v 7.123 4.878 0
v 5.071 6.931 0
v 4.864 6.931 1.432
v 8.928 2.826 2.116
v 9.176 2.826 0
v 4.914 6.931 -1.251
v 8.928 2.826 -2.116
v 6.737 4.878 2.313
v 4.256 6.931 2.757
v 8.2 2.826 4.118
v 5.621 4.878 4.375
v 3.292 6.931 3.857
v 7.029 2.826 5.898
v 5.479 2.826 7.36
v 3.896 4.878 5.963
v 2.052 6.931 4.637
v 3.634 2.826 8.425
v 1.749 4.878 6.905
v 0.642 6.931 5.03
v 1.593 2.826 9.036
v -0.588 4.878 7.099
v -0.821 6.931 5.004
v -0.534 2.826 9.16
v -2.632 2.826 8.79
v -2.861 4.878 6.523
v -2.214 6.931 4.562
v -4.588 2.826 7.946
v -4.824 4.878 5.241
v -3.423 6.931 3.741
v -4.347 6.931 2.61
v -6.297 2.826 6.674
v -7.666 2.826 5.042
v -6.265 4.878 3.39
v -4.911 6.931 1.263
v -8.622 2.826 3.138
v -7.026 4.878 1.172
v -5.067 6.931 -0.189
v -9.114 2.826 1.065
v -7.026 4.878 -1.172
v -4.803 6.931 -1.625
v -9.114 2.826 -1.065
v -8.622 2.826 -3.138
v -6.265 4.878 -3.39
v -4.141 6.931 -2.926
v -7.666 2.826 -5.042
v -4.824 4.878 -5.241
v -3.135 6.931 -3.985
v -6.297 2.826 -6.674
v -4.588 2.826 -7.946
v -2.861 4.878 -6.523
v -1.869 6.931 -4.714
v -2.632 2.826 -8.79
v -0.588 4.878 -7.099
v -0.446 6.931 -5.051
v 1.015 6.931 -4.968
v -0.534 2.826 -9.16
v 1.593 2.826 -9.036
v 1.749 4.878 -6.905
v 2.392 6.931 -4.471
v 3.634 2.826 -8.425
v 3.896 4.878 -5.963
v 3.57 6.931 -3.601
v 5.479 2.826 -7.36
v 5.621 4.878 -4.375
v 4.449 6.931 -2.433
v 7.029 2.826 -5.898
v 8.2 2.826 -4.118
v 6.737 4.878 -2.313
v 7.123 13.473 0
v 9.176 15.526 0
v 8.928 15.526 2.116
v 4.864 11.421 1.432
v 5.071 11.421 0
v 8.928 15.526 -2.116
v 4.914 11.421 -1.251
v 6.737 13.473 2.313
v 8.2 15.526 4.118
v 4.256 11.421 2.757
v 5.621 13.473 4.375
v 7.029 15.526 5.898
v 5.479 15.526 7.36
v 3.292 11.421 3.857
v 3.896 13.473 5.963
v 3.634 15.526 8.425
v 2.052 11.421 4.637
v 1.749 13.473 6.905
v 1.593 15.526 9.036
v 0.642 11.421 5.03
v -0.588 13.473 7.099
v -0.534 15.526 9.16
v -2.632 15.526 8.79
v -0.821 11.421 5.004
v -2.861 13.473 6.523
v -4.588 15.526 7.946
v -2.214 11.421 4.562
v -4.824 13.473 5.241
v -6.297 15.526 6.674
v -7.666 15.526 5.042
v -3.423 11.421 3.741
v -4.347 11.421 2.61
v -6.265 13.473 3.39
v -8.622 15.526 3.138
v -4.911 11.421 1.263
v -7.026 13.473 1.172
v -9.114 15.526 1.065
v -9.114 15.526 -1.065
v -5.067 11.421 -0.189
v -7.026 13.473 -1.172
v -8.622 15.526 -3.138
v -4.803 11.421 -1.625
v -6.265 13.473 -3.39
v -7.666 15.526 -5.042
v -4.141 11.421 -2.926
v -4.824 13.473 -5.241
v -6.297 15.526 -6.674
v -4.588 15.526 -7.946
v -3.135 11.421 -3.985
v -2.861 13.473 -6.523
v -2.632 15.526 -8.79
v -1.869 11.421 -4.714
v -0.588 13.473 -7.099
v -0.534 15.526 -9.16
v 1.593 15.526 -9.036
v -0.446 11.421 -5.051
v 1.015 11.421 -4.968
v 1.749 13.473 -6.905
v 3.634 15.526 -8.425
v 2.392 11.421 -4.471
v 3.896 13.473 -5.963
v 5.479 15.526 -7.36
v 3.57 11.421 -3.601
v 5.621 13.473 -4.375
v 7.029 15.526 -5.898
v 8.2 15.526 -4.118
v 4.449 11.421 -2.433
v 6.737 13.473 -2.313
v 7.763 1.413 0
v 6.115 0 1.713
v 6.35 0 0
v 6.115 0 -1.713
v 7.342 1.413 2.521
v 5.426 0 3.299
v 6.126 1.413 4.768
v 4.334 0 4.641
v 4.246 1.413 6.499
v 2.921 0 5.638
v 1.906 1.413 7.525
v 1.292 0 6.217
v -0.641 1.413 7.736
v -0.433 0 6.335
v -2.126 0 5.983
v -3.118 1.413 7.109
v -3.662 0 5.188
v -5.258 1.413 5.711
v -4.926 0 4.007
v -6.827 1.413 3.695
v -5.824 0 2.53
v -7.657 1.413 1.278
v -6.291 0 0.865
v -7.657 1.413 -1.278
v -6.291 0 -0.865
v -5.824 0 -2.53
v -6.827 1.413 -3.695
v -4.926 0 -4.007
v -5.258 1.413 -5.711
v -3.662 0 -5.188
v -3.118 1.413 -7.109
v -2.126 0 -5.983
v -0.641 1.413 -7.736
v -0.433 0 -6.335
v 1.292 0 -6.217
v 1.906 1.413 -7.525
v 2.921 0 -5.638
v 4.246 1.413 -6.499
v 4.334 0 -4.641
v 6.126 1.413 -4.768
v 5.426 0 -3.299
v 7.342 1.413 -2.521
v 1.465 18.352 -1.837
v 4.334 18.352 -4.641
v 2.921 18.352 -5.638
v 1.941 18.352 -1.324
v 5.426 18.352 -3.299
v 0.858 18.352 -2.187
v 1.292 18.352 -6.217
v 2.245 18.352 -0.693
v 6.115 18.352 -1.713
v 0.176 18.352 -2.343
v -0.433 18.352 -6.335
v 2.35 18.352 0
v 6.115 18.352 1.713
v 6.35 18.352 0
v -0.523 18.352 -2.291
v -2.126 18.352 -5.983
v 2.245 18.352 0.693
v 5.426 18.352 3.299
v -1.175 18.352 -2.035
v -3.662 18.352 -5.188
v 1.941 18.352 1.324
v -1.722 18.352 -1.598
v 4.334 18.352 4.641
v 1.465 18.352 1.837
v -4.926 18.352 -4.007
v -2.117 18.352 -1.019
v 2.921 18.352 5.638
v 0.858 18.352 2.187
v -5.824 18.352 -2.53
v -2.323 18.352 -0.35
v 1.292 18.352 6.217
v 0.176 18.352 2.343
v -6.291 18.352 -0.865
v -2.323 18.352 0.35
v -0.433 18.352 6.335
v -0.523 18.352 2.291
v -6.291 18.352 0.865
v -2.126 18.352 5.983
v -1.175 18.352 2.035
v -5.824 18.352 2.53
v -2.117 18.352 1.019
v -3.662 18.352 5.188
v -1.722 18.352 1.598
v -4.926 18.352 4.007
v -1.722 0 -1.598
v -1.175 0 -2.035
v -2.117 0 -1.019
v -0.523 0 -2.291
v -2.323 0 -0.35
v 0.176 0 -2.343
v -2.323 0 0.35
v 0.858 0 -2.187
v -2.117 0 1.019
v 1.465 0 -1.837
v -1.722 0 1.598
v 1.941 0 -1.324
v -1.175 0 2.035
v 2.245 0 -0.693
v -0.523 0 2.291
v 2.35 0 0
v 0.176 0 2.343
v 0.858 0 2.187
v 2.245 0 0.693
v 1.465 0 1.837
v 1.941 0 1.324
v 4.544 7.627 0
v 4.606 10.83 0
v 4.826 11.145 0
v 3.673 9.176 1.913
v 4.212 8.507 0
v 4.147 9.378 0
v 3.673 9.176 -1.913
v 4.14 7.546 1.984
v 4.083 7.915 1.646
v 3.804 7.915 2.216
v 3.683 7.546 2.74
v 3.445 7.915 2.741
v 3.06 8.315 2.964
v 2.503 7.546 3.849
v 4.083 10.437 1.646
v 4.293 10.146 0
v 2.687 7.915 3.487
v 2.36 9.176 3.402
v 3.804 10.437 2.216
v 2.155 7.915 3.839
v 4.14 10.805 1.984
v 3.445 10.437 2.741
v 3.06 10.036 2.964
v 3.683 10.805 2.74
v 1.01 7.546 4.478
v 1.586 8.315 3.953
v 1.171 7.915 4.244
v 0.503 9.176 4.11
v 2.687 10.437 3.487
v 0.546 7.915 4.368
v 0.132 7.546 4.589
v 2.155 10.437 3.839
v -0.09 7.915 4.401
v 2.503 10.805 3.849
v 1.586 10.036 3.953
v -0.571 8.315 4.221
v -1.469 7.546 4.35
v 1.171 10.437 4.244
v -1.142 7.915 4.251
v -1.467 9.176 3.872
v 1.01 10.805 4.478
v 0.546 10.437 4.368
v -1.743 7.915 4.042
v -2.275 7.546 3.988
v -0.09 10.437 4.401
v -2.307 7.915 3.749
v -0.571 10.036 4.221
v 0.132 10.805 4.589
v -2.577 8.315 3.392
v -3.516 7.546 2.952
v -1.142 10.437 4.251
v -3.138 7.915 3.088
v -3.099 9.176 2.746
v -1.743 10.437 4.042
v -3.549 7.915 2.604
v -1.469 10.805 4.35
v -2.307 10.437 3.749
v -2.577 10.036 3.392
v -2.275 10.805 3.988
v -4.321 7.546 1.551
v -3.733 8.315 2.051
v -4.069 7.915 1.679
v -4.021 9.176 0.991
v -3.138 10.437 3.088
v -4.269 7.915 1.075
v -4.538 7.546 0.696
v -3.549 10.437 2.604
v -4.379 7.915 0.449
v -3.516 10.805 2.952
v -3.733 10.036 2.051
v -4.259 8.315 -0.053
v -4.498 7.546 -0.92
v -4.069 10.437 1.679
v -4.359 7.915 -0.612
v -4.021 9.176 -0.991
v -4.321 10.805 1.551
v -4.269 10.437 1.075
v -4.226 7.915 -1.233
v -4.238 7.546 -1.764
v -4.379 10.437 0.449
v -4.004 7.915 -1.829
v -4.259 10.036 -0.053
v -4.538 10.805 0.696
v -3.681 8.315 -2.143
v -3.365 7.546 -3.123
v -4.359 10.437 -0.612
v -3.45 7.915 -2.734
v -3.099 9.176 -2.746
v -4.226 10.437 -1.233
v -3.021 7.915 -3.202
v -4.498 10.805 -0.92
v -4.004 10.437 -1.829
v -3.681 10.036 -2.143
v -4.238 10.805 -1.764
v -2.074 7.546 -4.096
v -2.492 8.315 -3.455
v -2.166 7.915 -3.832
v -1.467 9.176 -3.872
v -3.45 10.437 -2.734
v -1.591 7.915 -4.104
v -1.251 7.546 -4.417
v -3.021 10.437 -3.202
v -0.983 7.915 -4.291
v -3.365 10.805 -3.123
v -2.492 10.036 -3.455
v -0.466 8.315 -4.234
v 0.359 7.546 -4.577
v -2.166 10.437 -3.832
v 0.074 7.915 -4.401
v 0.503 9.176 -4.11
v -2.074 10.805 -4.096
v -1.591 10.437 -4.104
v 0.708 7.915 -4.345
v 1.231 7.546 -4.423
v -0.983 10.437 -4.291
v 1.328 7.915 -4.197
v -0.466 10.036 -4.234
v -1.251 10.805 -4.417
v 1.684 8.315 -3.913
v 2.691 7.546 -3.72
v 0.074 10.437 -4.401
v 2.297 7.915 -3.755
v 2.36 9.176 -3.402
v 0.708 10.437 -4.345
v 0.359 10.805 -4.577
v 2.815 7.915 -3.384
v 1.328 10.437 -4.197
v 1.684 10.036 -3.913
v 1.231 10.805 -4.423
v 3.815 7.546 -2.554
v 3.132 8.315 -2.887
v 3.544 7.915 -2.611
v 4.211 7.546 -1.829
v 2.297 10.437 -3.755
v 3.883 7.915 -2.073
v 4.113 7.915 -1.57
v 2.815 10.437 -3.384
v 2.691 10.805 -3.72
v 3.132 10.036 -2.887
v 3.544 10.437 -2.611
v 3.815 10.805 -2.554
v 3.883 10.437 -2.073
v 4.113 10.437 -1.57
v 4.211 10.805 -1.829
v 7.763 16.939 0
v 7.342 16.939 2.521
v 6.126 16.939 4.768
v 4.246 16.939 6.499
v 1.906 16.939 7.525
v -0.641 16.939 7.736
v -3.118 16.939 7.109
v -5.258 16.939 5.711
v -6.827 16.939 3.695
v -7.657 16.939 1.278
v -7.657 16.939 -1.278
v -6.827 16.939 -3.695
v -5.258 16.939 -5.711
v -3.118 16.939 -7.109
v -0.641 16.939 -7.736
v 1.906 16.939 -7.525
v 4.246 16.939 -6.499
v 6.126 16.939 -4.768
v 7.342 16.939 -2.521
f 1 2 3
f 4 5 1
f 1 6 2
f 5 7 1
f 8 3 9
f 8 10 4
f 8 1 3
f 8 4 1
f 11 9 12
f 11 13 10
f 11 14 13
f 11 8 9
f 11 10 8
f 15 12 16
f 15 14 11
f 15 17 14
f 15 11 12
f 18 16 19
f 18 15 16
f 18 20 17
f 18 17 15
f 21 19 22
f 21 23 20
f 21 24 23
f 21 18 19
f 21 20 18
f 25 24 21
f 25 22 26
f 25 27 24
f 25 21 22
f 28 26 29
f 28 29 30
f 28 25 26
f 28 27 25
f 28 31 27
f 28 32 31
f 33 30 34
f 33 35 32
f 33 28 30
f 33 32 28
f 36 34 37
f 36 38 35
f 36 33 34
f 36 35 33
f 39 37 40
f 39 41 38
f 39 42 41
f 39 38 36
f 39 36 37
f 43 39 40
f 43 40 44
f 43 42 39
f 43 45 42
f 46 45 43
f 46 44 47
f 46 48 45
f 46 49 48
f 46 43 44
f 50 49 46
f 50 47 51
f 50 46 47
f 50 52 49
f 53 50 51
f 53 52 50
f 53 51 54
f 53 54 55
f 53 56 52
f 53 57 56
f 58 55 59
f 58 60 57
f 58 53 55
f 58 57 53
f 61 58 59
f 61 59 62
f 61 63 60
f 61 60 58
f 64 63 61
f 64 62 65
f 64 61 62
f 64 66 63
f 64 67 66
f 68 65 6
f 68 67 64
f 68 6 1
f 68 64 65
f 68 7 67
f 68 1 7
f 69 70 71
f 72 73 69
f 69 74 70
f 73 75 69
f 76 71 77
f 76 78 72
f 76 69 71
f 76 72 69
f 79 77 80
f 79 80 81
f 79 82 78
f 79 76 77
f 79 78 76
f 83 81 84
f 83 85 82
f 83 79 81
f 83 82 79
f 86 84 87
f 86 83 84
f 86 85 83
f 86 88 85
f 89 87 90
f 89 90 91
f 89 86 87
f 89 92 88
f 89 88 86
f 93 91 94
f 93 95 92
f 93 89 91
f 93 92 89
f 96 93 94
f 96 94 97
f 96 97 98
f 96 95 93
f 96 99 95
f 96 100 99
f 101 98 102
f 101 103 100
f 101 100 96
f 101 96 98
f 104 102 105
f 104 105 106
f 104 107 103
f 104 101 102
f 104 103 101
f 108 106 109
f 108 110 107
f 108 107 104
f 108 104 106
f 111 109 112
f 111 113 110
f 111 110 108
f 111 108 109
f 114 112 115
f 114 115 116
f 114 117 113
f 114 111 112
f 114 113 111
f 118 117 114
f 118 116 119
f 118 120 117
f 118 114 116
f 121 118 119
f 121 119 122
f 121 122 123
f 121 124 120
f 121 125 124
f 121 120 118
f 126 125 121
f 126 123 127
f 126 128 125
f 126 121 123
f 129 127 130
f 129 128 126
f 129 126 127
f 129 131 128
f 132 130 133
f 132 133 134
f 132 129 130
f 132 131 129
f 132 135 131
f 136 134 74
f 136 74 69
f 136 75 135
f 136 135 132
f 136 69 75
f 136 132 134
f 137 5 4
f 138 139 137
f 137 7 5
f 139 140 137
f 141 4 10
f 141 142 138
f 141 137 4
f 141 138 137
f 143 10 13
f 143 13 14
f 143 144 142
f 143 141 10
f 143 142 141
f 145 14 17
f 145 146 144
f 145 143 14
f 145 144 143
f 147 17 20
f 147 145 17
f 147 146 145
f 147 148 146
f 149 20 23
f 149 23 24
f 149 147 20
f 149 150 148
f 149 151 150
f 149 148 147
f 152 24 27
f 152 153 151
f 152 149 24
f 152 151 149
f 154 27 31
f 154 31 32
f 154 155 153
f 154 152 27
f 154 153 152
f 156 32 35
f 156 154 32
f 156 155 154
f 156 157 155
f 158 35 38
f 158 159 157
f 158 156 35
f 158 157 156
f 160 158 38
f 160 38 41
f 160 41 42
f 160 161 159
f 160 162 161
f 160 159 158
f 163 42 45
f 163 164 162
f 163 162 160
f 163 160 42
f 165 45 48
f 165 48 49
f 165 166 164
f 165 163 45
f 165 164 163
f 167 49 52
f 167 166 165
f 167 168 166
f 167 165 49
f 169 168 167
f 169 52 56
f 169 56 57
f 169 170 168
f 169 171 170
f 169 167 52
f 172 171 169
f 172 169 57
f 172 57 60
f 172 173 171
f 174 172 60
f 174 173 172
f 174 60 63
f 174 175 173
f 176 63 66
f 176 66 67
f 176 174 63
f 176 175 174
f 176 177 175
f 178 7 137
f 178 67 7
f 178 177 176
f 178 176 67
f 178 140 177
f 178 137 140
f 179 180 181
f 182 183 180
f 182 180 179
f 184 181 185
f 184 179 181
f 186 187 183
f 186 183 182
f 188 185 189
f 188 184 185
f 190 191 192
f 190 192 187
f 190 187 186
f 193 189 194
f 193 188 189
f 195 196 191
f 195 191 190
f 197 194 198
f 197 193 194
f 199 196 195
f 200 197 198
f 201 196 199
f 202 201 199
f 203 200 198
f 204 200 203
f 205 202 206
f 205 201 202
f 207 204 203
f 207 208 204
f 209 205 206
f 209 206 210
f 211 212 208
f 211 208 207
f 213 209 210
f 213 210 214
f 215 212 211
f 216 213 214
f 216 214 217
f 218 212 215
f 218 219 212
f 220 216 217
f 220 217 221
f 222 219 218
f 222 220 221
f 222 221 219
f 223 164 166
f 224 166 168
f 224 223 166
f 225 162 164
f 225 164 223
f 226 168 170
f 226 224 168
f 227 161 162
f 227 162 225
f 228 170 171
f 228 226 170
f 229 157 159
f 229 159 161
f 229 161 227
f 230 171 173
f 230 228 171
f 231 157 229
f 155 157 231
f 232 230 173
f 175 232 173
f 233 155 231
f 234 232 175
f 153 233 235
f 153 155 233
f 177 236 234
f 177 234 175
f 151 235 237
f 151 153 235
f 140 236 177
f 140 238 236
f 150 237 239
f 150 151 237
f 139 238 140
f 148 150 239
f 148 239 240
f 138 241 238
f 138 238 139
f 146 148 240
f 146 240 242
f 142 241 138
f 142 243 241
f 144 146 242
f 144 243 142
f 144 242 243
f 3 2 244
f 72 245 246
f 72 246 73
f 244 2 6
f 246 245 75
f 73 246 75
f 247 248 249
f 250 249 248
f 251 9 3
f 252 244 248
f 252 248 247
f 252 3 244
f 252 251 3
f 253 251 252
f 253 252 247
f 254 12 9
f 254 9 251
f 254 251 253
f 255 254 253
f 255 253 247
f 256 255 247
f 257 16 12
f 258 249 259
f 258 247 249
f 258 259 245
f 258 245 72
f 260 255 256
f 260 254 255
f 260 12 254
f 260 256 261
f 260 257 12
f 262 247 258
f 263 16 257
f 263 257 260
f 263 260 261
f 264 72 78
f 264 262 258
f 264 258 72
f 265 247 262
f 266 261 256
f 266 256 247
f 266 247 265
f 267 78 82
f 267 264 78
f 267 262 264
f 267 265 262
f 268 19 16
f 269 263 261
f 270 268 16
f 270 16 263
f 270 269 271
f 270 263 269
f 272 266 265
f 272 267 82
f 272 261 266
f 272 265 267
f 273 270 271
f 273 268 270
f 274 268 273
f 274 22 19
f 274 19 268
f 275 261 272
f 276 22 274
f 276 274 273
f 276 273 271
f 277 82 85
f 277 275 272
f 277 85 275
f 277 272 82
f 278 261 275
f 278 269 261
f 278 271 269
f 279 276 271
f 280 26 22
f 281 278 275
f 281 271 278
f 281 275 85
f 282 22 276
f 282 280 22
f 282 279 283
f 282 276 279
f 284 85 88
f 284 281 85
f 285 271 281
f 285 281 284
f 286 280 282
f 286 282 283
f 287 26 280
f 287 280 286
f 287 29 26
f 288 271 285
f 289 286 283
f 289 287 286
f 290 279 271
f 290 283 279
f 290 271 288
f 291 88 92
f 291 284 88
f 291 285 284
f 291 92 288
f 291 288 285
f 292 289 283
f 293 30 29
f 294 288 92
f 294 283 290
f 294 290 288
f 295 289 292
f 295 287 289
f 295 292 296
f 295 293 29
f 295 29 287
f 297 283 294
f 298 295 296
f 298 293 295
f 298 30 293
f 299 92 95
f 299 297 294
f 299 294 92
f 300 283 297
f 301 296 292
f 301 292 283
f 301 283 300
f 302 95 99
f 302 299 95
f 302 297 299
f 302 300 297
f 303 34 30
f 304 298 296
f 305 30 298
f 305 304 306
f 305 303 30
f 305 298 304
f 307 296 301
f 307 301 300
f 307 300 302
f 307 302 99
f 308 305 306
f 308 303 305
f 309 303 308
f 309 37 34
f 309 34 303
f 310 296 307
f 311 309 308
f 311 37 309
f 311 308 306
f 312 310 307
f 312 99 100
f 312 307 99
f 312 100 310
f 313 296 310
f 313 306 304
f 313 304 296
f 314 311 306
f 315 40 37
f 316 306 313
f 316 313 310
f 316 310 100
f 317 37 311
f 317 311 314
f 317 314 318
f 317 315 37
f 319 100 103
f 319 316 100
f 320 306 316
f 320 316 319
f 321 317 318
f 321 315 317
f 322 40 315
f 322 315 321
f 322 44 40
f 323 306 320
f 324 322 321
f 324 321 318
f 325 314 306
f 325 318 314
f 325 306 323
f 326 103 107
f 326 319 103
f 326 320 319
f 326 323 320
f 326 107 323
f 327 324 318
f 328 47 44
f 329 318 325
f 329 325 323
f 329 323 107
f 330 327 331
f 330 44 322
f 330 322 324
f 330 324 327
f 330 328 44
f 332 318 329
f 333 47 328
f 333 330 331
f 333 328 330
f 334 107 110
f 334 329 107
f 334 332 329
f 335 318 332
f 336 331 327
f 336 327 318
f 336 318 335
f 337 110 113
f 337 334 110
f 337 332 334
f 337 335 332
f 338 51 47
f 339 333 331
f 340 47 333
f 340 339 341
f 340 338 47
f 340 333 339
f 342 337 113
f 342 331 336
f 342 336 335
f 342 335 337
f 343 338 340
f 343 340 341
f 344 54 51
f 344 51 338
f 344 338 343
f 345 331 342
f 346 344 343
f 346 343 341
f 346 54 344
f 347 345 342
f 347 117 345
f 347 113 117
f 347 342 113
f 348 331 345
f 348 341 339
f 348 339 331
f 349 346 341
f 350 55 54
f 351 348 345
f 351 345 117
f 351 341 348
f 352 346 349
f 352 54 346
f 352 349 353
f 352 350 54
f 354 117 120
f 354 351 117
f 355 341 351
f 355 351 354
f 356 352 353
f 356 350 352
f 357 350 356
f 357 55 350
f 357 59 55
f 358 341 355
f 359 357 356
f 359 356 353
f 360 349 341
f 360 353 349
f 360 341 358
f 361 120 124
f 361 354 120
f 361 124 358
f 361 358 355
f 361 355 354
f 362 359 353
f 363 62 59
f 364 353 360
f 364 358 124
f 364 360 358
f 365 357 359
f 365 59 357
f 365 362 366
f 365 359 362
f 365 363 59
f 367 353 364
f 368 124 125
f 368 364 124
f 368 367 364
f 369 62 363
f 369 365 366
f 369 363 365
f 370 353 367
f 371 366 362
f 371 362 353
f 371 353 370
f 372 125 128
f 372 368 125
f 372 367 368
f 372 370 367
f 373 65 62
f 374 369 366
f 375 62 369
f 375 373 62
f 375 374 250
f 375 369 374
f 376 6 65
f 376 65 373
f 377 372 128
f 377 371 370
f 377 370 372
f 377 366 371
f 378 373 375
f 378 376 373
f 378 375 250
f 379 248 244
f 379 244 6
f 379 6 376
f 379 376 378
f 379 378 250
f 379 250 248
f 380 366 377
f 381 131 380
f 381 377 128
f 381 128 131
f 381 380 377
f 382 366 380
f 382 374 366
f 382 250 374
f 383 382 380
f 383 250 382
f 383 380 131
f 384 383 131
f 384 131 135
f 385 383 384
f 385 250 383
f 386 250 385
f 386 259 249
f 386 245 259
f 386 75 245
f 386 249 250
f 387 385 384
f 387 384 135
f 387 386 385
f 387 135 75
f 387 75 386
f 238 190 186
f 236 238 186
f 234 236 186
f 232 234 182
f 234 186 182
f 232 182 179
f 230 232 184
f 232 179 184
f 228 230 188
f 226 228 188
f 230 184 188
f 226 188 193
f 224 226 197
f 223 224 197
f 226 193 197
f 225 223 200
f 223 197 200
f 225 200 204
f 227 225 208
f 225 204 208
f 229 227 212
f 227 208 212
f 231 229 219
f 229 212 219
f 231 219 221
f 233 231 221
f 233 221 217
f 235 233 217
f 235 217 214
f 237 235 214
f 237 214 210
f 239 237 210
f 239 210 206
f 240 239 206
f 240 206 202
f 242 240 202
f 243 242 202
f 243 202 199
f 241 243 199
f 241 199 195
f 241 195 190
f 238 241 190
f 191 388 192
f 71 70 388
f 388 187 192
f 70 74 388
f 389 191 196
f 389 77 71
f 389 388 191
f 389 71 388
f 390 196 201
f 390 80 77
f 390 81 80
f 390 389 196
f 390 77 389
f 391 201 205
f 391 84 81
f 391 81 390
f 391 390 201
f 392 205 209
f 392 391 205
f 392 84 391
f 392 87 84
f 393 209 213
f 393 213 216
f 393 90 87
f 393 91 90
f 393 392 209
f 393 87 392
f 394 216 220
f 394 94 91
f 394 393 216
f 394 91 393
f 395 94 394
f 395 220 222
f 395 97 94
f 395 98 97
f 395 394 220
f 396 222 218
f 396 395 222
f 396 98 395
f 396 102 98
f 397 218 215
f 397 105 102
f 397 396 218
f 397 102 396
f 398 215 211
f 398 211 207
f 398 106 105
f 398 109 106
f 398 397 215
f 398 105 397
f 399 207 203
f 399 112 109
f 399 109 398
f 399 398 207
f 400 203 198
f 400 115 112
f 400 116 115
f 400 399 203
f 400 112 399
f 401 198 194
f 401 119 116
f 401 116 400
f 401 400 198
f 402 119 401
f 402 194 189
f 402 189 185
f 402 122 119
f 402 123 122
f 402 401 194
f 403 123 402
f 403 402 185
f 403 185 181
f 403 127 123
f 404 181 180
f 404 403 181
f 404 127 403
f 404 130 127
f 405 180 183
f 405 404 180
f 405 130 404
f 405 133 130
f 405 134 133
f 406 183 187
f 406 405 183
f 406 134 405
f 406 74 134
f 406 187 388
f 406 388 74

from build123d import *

# Parameters (mm, degrees)
SKETCH3_R          = 2.3495
CUT_EXTRUDE1_DEPTH = 19.3515
FILLET1_R          = 3.175


with BuildPart() as part:
    # Sketch2 → Revolve1 (revolve)
    with BuildSketch(Plane.XY):
        Polygon((9.17575, 2.82575), (6.35, 0), (0, 0), (0, 18.3515), (6.35, 18.3515), (9.17575, 15.52575), (2.82575, 9.17575), align=None)
    revolve(axis=Axis((0, 18.3515, 0), (0, -1, 0)))

    # Sketch3 → Cut-Extrude1 (cut, through all)
    with BuildSketch(Plane(origin=(0, 18.3515, 0), x_dir=(1, 0, 0), z_dir=(0, 1, 0))):
        Circle(SKETCH3_R)
    extrude(amount=-CUT_EXTRUDE1_DEPTH, mode=Mode.SUBTRACT)

    # Fillet1
    fillet1_edges = [part.edges().sort_by_distance(p)[0] for p in [
        (-2.82575, 9.17575, 0),
    ]]
    fillet(fillet1_edges, radius=FILLET1_R)


solid = part.part
